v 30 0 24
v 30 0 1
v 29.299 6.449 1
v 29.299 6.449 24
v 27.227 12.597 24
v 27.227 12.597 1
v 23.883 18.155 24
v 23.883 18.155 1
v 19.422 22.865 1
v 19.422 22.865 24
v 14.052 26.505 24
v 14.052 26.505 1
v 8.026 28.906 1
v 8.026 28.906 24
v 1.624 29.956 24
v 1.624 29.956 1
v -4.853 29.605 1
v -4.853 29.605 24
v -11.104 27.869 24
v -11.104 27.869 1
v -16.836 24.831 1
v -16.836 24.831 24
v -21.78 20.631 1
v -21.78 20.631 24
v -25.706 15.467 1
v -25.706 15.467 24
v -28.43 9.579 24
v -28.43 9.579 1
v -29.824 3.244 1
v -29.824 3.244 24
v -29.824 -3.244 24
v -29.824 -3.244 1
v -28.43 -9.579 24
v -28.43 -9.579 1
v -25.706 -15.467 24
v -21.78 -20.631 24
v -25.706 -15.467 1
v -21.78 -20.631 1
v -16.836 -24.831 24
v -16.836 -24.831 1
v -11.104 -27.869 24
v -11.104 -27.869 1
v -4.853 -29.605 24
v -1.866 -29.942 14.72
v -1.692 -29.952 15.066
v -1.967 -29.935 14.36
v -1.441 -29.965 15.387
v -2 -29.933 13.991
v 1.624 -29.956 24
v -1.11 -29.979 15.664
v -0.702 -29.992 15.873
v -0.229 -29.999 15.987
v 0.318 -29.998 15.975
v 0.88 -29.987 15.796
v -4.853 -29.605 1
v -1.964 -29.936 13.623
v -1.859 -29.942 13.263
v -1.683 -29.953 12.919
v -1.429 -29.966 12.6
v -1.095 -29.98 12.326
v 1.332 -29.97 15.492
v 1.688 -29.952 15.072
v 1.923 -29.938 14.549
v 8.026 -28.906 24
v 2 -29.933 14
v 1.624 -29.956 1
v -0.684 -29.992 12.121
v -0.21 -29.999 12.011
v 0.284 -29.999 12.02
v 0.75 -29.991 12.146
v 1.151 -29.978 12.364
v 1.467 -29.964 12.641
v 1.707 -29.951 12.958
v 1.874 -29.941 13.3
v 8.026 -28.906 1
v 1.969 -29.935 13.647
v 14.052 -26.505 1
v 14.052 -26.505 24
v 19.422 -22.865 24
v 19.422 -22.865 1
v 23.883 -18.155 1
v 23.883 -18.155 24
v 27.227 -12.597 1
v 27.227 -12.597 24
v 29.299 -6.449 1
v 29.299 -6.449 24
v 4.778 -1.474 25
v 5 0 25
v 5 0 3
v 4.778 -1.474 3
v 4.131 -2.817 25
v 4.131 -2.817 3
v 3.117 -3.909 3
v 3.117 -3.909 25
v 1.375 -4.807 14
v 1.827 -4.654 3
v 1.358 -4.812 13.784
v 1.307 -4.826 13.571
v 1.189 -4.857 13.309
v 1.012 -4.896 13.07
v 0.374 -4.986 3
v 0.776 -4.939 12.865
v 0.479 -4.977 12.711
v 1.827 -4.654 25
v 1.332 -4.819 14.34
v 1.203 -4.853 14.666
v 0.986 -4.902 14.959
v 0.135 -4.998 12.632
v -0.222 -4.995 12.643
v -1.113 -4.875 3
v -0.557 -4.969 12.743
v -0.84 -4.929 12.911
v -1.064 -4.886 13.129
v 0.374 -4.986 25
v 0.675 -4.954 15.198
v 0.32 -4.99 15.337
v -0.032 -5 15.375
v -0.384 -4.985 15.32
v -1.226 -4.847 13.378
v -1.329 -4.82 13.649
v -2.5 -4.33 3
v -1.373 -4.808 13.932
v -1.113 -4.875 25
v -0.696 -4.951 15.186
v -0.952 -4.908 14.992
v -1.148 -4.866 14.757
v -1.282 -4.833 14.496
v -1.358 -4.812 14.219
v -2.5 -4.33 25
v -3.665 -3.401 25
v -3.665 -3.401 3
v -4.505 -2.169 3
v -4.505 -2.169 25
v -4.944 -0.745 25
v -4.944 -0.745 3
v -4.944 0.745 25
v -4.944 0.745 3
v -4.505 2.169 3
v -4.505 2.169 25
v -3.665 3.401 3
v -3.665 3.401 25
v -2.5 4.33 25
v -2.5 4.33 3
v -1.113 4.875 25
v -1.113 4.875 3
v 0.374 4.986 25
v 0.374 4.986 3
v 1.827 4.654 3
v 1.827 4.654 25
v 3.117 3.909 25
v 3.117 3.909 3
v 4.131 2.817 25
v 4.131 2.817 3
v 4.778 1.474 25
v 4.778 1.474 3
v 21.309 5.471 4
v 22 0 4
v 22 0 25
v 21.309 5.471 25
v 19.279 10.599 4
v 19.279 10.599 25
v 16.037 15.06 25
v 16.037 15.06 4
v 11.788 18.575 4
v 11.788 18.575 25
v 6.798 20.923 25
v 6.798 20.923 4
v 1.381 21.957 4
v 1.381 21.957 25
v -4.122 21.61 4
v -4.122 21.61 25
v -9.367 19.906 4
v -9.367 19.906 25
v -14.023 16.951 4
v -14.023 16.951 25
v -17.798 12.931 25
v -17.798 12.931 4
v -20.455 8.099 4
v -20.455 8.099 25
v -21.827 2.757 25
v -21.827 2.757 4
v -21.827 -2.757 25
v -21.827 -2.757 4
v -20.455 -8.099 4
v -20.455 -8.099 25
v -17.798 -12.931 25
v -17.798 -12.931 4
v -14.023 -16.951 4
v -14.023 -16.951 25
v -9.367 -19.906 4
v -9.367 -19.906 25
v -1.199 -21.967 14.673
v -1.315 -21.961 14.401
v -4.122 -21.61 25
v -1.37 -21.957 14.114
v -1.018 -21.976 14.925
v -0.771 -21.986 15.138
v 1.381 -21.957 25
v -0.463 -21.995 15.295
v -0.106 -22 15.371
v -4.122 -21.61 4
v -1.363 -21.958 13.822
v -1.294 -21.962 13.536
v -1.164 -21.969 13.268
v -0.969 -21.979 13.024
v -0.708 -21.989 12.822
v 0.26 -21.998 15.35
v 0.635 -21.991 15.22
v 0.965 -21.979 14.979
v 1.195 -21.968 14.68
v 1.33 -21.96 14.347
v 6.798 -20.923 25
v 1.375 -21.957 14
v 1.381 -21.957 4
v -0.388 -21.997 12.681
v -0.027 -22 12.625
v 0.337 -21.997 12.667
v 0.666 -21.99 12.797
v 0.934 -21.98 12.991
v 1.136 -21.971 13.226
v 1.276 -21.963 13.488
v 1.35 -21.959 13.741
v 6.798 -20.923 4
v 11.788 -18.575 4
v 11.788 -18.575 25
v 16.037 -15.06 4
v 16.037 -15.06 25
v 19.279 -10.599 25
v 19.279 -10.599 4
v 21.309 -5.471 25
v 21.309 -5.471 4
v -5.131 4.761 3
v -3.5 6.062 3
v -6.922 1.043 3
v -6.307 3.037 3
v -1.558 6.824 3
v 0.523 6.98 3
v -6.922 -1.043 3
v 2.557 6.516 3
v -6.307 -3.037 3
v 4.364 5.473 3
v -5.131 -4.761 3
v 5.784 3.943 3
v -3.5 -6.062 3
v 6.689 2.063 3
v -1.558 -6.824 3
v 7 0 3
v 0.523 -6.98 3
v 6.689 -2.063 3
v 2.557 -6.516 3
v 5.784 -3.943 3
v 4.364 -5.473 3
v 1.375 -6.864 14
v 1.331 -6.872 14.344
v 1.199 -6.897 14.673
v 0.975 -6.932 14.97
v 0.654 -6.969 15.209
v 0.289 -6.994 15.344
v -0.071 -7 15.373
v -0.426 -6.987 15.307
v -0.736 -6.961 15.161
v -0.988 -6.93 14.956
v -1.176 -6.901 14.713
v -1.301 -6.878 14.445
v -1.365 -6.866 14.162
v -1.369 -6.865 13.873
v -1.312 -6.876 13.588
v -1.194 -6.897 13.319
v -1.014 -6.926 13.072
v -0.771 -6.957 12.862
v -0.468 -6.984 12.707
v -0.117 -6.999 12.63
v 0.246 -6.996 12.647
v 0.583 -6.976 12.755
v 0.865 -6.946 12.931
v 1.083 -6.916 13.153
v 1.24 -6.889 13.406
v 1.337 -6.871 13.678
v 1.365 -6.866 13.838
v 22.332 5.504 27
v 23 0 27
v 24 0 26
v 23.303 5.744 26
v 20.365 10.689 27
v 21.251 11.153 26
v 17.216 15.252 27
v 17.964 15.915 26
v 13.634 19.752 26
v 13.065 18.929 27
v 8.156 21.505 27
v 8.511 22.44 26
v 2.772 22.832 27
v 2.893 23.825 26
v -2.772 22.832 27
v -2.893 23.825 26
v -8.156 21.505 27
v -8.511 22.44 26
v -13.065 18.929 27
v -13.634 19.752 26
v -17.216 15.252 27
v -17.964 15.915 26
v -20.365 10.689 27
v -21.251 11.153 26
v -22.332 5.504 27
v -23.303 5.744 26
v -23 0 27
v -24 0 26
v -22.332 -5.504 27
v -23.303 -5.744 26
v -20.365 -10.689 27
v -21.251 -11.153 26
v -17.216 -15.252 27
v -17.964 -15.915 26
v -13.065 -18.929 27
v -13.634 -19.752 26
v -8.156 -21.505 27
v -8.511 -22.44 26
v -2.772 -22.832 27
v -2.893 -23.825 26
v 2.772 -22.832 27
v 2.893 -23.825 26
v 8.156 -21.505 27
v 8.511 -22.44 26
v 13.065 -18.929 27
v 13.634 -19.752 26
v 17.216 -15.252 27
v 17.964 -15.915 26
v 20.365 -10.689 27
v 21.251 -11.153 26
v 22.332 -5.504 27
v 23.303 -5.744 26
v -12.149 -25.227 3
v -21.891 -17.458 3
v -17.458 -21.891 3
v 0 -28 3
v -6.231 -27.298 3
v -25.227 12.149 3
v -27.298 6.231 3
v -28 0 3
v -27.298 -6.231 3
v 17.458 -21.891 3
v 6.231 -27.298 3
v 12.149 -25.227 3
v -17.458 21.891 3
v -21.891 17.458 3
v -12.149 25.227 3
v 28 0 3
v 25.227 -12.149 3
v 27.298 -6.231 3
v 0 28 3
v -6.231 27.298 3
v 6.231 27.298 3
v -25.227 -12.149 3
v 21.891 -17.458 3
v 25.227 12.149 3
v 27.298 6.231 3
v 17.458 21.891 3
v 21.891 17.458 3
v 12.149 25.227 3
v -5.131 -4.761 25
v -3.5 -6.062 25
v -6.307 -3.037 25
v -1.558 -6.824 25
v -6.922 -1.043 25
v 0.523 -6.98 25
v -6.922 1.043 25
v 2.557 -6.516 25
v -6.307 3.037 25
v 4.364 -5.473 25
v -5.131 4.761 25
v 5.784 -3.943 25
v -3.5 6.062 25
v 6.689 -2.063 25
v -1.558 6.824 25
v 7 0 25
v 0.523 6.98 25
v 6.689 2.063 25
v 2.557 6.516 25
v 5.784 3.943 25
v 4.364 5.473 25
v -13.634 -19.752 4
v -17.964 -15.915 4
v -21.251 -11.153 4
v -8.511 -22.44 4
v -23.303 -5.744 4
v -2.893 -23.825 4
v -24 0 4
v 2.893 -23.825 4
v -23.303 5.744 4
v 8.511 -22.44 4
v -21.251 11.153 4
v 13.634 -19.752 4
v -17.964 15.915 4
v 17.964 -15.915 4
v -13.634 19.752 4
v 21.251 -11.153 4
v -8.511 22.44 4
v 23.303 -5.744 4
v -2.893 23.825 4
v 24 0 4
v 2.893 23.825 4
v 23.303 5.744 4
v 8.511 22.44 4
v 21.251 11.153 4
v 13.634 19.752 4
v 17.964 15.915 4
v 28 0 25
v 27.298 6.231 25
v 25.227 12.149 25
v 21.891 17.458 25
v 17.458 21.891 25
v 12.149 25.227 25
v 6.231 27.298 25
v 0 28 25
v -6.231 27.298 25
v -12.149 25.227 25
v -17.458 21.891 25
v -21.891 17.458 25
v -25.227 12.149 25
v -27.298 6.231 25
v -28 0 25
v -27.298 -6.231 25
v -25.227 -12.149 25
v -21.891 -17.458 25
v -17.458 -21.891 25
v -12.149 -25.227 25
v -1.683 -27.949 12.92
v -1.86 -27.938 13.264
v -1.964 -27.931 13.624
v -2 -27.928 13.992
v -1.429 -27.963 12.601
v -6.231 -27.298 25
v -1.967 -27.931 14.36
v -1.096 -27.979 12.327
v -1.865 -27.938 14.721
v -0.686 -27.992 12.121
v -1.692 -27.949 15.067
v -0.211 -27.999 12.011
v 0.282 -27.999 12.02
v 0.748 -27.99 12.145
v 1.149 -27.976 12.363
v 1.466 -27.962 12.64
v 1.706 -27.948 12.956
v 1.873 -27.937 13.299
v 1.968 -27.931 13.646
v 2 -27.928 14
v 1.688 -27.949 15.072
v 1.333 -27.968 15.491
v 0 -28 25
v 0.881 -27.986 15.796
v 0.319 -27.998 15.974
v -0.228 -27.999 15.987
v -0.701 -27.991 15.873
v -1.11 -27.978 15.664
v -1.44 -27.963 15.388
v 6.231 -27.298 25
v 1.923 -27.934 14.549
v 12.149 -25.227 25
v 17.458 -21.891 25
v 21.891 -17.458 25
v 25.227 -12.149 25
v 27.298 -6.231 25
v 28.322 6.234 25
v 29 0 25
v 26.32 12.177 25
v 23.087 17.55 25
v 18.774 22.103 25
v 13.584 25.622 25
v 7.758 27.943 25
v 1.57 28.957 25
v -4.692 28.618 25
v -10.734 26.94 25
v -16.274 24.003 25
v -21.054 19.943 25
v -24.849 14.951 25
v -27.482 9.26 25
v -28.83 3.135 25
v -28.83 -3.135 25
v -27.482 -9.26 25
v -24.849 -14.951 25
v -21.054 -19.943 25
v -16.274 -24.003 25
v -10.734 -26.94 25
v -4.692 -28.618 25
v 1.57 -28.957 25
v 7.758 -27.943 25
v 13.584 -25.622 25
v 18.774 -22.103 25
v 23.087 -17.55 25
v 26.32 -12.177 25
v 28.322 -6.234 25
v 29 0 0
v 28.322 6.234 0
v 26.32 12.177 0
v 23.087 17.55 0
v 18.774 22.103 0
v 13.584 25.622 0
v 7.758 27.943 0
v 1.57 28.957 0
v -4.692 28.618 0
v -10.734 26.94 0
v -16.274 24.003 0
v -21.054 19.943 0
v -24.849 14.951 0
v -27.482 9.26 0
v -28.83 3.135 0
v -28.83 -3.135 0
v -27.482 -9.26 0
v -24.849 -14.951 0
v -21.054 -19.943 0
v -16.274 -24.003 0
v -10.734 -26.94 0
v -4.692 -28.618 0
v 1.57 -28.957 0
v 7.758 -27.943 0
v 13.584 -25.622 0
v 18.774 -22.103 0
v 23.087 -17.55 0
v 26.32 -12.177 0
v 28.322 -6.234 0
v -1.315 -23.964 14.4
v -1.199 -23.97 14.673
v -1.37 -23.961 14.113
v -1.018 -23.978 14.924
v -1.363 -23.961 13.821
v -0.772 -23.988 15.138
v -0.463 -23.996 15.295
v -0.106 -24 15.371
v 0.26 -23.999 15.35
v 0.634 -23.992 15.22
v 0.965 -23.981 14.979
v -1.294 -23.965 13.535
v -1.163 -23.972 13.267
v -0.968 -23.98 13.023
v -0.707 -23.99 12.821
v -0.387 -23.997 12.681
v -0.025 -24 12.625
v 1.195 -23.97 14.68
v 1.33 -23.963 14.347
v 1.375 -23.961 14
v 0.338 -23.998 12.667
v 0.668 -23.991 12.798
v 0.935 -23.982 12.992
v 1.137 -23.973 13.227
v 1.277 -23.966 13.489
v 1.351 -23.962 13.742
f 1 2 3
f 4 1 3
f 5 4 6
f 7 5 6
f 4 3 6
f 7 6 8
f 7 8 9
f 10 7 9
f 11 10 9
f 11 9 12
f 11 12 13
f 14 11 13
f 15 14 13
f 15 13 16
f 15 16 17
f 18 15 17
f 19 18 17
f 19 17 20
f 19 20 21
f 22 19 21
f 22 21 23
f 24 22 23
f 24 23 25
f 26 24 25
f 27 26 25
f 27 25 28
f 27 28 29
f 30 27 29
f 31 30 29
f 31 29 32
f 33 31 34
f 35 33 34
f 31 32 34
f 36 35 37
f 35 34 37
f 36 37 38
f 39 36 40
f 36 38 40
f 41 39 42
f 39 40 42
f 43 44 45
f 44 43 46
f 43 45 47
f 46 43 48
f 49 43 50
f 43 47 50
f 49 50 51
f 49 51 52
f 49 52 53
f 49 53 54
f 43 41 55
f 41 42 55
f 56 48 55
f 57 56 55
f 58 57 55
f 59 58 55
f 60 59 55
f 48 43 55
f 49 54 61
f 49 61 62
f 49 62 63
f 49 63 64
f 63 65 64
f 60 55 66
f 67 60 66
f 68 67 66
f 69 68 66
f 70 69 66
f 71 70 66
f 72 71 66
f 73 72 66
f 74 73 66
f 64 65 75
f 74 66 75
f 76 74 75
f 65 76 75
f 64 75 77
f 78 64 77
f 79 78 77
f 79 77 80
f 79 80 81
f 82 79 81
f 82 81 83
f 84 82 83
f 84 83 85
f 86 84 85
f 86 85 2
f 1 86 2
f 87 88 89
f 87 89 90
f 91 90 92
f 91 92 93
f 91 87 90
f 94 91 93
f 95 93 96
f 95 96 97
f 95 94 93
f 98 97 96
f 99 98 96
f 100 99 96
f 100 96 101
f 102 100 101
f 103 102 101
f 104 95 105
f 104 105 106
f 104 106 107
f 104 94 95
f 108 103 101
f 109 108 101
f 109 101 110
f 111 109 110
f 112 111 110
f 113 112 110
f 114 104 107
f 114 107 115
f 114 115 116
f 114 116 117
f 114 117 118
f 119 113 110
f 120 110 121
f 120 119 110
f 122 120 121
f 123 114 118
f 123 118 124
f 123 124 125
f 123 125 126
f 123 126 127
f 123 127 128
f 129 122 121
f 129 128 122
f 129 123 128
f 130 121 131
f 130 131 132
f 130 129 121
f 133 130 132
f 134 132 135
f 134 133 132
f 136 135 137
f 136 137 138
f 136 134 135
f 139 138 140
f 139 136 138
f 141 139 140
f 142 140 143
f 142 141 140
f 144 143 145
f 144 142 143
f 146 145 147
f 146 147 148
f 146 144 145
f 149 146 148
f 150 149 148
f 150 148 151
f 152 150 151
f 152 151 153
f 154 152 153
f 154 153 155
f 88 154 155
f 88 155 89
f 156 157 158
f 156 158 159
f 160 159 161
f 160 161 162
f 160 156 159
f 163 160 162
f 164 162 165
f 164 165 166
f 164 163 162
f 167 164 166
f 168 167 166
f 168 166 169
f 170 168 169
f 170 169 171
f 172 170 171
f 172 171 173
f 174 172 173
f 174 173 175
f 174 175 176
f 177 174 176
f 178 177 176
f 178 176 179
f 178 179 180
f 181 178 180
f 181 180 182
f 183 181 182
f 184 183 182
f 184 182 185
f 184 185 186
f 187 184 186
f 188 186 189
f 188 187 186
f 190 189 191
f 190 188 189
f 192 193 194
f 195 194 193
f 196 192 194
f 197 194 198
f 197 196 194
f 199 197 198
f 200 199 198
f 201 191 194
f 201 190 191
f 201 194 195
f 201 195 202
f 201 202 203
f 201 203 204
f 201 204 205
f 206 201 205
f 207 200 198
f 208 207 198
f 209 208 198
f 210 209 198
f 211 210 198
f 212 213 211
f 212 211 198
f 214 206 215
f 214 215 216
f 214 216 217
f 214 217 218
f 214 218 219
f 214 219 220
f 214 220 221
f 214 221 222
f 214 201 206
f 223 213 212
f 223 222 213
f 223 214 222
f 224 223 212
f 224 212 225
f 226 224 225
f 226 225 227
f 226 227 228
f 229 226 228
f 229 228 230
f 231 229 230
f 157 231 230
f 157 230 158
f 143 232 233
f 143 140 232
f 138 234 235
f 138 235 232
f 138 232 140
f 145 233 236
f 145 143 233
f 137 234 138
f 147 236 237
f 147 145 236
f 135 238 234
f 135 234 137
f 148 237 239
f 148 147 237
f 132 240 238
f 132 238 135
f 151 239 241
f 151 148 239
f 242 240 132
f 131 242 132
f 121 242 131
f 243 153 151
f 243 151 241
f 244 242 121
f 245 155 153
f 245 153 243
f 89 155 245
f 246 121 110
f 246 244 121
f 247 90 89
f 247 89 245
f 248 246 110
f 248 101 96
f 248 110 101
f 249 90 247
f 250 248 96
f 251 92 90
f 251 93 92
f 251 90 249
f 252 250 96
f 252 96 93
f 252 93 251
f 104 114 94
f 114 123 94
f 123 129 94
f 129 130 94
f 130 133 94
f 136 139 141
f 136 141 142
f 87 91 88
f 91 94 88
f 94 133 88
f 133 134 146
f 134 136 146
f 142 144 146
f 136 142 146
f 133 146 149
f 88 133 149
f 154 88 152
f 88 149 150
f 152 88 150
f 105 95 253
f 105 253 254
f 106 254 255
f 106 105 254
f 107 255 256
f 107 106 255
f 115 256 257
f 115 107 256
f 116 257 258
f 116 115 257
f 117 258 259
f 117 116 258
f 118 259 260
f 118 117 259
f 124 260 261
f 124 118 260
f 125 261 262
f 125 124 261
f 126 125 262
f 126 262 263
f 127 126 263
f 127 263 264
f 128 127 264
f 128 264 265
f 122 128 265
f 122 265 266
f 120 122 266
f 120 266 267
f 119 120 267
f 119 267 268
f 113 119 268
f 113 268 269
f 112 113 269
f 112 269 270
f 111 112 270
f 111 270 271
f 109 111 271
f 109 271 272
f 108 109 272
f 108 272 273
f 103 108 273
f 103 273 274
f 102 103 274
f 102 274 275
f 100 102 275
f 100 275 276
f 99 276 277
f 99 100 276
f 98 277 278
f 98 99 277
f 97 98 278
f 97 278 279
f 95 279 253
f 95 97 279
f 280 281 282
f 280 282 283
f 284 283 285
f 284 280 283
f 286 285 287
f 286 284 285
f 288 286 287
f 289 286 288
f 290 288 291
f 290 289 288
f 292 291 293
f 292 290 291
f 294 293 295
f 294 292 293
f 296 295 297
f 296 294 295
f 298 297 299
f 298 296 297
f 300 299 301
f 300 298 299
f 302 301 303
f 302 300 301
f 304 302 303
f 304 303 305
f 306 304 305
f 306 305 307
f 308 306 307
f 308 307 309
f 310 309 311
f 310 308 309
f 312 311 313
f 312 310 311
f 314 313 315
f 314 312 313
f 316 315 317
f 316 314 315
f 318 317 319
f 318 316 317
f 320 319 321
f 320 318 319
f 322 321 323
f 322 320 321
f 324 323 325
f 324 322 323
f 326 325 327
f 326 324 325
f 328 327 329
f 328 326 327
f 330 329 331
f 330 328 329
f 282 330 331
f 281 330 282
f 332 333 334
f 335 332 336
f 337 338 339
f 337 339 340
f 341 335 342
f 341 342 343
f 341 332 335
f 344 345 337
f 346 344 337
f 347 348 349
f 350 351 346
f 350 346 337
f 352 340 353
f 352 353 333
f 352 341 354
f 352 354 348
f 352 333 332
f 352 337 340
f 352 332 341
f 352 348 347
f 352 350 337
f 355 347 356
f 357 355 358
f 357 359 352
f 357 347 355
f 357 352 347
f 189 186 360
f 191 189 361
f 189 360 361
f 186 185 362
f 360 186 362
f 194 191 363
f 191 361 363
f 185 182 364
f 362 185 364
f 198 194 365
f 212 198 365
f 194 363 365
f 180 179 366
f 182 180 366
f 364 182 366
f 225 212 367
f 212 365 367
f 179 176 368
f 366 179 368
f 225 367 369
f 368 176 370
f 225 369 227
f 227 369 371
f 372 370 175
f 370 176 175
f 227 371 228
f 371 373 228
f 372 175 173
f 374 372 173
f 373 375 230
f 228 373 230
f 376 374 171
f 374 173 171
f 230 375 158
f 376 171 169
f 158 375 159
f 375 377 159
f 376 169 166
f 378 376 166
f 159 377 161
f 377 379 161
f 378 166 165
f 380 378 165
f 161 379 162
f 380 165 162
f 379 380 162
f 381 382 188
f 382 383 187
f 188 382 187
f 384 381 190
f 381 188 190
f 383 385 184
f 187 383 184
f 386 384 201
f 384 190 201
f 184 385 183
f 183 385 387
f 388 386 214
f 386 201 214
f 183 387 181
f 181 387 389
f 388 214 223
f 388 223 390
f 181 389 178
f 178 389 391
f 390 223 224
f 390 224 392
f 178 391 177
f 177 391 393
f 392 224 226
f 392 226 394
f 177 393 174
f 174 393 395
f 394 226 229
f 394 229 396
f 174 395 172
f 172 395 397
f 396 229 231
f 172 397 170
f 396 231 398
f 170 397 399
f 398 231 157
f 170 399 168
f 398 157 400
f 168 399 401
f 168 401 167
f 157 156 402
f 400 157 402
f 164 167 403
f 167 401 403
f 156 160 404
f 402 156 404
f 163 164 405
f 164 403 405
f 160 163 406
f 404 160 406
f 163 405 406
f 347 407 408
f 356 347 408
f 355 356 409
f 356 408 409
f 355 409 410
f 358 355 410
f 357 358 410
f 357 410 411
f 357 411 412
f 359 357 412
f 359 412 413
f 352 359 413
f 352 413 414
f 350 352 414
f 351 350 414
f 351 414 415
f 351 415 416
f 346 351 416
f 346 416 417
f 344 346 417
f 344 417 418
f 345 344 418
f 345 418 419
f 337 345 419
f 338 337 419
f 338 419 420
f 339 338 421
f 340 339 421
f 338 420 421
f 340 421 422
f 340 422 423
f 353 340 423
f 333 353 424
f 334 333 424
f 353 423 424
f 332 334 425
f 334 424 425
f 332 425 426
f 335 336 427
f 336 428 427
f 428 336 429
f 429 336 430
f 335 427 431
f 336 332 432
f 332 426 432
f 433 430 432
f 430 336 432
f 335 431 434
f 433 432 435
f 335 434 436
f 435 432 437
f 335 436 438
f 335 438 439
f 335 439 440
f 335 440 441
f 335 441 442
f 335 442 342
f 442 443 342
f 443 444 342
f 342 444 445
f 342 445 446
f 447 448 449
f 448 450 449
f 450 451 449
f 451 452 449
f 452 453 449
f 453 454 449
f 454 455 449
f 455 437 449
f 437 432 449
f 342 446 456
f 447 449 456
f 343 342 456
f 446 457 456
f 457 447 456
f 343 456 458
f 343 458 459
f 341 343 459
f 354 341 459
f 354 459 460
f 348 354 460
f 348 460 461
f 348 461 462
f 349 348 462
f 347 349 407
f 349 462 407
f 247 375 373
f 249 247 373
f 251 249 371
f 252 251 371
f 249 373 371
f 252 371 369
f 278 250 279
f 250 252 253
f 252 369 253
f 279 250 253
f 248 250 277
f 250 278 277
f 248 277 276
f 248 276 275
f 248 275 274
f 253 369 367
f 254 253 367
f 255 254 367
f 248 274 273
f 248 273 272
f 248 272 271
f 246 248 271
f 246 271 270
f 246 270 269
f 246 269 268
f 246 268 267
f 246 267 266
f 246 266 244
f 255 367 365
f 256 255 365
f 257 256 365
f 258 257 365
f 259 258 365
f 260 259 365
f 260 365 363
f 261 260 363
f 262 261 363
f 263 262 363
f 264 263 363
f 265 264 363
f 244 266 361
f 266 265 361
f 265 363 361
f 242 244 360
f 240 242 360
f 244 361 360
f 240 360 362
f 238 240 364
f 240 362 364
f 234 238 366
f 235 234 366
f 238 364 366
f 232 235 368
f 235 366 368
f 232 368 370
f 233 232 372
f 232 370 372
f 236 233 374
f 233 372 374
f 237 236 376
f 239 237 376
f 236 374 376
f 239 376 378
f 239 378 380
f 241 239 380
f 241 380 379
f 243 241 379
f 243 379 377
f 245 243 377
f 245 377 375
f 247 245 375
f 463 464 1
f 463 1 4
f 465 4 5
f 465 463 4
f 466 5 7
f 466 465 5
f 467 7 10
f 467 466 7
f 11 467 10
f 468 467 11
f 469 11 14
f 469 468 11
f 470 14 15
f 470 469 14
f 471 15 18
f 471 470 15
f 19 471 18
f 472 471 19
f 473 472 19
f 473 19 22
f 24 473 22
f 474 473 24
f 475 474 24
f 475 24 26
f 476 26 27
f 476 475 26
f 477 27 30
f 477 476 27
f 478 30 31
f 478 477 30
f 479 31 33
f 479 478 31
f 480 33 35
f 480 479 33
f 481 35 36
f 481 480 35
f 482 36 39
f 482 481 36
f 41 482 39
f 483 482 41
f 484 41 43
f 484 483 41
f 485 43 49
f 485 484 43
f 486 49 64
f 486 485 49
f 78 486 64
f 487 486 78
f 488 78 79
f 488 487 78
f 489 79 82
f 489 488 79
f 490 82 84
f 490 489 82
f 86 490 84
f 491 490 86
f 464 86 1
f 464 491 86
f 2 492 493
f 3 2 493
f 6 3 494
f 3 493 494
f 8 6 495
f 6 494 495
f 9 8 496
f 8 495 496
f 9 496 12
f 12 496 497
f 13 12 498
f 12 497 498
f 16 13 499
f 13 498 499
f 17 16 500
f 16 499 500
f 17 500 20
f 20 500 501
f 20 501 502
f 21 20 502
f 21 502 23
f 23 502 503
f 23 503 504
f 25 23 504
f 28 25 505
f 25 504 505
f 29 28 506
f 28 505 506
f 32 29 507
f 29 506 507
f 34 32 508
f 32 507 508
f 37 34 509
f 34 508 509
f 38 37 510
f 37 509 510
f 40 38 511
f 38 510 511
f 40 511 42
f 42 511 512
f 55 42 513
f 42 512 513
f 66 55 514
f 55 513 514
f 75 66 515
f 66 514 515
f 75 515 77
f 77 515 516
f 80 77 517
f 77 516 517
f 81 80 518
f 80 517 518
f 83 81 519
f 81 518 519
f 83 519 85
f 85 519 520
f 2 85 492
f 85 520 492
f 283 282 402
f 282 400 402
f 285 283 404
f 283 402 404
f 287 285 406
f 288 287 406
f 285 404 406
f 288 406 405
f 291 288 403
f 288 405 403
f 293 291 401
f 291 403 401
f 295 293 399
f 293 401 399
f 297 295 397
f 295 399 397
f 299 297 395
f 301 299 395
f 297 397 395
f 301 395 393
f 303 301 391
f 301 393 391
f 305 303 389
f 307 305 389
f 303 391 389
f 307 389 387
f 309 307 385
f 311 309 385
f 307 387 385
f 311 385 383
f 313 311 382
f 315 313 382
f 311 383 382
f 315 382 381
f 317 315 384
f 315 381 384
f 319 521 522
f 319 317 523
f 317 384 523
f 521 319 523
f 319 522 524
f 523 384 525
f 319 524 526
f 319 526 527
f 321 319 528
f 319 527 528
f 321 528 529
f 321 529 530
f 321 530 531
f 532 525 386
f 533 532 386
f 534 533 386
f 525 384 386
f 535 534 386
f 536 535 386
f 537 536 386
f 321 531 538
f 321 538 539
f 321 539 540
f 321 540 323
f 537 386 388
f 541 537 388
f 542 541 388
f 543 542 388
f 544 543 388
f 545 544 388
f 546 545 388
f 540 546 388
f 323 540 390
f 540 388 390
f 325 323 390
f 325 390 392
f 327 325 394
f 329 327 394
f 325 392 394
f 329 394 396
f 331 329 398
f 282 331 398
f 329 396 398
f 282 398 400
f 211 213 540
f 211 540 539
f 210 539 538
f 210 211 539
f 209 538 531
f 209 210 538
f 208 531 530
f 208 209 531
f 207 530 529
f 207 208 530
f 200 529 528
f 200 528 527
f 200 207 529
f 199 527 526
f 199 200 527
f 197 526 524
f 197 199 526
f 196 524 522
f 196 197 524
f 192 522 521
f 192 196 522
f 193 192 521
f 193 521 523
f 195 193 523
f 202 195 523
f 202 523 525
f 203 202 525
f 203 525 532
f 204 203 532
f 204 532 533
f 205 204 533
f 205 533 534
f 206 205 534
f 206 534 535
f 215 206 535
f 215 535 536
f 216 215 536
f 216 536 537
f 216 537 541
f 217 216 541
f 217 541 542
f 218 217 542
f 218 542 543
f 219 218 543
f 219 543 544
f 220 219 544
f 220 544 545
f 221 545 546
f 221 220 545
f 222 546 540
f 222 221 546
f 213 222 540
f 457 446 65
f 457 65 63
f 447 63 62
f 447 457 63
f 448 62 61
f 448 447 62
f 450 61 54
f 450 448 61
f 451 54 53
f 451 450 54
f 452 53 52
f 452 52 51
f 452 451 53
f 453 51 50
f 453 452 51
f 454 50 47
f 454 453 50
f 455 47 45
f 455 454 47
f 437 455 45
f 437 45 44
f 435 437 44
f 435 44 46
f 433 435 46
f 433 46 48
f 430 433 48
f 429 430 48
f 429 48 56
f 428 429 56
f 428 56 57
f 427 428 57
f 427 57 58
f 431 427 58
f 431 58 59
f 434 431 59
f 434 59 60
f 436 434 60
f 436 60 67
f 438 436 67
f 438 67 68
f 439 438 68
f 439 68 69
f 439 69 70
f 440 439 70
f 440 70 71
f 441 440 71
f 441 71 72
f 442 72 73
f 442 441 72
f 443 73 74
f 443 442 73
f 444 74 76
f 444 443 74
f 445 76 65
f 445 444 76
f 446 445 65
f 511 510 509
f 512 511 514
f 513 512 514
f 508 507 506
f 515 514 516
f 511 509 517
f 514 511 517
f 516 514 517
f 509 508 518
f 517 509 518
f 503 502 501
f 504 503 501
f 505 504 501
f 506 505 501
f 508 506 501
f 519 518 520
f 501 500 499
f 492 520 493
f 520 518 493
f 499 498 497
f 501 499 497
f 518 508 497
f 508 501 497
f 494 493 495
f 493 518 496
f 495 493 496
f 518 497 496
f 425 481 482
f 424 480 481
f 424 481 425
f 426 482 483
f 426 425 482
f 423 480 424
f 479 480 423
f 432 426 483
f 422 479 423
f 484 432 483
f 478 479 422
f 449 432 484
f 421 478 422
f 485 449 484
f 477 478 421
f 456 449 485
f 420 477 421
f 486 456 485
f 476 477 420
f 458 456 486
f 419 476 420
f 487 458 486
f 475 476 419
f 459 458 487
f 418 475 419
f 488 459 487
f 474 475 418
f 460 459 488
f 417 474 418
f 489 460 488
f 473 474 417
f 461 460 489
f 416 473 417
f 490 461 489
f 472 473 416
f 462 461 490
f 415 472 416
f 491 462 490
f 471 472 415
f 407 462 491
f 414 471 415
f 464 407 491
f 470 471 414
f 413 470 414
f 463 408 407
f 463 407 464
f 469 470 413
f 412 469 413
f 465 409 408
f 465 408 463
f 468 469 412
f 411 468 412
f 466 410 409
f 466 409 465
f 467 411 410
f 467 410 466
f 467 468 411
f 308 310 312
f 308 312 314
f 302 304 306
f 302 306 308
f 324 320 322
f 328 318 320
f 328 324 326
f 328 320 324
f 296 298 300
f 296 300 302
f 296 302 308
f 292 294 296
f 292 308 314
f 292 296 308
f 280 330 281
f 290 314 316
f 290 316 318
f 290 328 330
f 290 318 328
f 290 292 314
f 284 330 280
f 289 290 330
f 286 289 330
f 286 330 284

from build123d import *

# Parameters (mm, degrees)
F0_R       = 30
F1_DEPTH   = 25
F2_R       = 28
F3_DEPTH   = 22
F5_R       = 24
F5_R_2     = 22
F6_DEPTH   = 21
F7_R       = 24
F8_DEPTH   = 2
F9_R       = 7
F9_R_2     = 5
F10_DEPTH  = 22
F11_SIZE   = 1
F11_2_SIZE = 1
F12_R      = 1.375
F13_DEPTH  = 30.001
F14_R      = 2
F15_DEPTH  = 30.0010001118


with BuildPart() as f1:
    # F0 (on Top) → F1 (new body)
    with BuildSketch(Plane.XY):
        Circle(F0_R)
    extrude(amount=F1_DEPTH)

    # F2 (on face) → F3 (cut)
    with BuildSketch(Plane.XY.offset(25)):
        Circle(F2_R)
    extrude(amount=-F3_DEPTH, mode=Mode.SUBTRACT)

    # F11
    f11_edges = [f1.edges().sort_by_distance(p)[0] for p in [
        (-30, 0, 0),
        (-30, 0, 25),
    ]]
    chamfer(f11_edges, length=F11_SIZE)


with BuildPart() as f6:
    # F5 (on offset) → F6 (new body)
    with BuildSketch(Plane.XY.offset(4)):
        Circle(F5_R)
        Circle(F5_R_2, mode=Mode.SUBTRACT)
    extrude(amount=F6_DEPTH)

    # F7 (on face) → F8 (join)
    with BuildSketch(Plane.XY.offset(25)):
        Circle(F7_R)
    extrude(amount=F8_DEPTH)

    # F9 (on face) → F10 (join)
    with BuildSketch(Plane(origin=(0, 0, 25), x_dir=(1, 0, 0), z_dir=(0, 0, -1))):
        Circle(F9_R)
        Circle(F9_R_2, mode=Mode.SUBTRACT)
    extrude(amount=F10_DEPTH)

    # F11#2
    f11_2_edges = [f6.edges().sort_by_distance(p)[0] for p in [
        (-24, 0, 27),
    ]]
    chamfer(f11_2_edges, length=F11_2_SIZE)


with BuildPart() as f13_tool:
    # F12 (on Front) → F13 (new body, through all)
    with BuildSketch(Plane.XZ):
        with Locations((0, 14)):
            Circle(F12_R)
    extrude(amount=F13_DEPTH)


with BuildPart() as f1_1:
    add(f1.part)

    # F13: cut by f13_tool
    add(f13_tool.part, mode=Mode.SUBTRACT)

    # F14 (on Front) → F15 (cut, through all)
    with BuildSketch(Plane.XZ):
        with Locations((0, 14)):
            Circle(F14_R)
    extrude(amount=F15_DEPTH, mode=Mode.SUBTRACT)


with BuildPart() as f6_1:
    add(f6.part)

    # F13: cut by f13_tool
    add(f13_tool.part, mode=Mode.SUBTRACT)


solid = Compound([f1_1.part, f6_1.part])
